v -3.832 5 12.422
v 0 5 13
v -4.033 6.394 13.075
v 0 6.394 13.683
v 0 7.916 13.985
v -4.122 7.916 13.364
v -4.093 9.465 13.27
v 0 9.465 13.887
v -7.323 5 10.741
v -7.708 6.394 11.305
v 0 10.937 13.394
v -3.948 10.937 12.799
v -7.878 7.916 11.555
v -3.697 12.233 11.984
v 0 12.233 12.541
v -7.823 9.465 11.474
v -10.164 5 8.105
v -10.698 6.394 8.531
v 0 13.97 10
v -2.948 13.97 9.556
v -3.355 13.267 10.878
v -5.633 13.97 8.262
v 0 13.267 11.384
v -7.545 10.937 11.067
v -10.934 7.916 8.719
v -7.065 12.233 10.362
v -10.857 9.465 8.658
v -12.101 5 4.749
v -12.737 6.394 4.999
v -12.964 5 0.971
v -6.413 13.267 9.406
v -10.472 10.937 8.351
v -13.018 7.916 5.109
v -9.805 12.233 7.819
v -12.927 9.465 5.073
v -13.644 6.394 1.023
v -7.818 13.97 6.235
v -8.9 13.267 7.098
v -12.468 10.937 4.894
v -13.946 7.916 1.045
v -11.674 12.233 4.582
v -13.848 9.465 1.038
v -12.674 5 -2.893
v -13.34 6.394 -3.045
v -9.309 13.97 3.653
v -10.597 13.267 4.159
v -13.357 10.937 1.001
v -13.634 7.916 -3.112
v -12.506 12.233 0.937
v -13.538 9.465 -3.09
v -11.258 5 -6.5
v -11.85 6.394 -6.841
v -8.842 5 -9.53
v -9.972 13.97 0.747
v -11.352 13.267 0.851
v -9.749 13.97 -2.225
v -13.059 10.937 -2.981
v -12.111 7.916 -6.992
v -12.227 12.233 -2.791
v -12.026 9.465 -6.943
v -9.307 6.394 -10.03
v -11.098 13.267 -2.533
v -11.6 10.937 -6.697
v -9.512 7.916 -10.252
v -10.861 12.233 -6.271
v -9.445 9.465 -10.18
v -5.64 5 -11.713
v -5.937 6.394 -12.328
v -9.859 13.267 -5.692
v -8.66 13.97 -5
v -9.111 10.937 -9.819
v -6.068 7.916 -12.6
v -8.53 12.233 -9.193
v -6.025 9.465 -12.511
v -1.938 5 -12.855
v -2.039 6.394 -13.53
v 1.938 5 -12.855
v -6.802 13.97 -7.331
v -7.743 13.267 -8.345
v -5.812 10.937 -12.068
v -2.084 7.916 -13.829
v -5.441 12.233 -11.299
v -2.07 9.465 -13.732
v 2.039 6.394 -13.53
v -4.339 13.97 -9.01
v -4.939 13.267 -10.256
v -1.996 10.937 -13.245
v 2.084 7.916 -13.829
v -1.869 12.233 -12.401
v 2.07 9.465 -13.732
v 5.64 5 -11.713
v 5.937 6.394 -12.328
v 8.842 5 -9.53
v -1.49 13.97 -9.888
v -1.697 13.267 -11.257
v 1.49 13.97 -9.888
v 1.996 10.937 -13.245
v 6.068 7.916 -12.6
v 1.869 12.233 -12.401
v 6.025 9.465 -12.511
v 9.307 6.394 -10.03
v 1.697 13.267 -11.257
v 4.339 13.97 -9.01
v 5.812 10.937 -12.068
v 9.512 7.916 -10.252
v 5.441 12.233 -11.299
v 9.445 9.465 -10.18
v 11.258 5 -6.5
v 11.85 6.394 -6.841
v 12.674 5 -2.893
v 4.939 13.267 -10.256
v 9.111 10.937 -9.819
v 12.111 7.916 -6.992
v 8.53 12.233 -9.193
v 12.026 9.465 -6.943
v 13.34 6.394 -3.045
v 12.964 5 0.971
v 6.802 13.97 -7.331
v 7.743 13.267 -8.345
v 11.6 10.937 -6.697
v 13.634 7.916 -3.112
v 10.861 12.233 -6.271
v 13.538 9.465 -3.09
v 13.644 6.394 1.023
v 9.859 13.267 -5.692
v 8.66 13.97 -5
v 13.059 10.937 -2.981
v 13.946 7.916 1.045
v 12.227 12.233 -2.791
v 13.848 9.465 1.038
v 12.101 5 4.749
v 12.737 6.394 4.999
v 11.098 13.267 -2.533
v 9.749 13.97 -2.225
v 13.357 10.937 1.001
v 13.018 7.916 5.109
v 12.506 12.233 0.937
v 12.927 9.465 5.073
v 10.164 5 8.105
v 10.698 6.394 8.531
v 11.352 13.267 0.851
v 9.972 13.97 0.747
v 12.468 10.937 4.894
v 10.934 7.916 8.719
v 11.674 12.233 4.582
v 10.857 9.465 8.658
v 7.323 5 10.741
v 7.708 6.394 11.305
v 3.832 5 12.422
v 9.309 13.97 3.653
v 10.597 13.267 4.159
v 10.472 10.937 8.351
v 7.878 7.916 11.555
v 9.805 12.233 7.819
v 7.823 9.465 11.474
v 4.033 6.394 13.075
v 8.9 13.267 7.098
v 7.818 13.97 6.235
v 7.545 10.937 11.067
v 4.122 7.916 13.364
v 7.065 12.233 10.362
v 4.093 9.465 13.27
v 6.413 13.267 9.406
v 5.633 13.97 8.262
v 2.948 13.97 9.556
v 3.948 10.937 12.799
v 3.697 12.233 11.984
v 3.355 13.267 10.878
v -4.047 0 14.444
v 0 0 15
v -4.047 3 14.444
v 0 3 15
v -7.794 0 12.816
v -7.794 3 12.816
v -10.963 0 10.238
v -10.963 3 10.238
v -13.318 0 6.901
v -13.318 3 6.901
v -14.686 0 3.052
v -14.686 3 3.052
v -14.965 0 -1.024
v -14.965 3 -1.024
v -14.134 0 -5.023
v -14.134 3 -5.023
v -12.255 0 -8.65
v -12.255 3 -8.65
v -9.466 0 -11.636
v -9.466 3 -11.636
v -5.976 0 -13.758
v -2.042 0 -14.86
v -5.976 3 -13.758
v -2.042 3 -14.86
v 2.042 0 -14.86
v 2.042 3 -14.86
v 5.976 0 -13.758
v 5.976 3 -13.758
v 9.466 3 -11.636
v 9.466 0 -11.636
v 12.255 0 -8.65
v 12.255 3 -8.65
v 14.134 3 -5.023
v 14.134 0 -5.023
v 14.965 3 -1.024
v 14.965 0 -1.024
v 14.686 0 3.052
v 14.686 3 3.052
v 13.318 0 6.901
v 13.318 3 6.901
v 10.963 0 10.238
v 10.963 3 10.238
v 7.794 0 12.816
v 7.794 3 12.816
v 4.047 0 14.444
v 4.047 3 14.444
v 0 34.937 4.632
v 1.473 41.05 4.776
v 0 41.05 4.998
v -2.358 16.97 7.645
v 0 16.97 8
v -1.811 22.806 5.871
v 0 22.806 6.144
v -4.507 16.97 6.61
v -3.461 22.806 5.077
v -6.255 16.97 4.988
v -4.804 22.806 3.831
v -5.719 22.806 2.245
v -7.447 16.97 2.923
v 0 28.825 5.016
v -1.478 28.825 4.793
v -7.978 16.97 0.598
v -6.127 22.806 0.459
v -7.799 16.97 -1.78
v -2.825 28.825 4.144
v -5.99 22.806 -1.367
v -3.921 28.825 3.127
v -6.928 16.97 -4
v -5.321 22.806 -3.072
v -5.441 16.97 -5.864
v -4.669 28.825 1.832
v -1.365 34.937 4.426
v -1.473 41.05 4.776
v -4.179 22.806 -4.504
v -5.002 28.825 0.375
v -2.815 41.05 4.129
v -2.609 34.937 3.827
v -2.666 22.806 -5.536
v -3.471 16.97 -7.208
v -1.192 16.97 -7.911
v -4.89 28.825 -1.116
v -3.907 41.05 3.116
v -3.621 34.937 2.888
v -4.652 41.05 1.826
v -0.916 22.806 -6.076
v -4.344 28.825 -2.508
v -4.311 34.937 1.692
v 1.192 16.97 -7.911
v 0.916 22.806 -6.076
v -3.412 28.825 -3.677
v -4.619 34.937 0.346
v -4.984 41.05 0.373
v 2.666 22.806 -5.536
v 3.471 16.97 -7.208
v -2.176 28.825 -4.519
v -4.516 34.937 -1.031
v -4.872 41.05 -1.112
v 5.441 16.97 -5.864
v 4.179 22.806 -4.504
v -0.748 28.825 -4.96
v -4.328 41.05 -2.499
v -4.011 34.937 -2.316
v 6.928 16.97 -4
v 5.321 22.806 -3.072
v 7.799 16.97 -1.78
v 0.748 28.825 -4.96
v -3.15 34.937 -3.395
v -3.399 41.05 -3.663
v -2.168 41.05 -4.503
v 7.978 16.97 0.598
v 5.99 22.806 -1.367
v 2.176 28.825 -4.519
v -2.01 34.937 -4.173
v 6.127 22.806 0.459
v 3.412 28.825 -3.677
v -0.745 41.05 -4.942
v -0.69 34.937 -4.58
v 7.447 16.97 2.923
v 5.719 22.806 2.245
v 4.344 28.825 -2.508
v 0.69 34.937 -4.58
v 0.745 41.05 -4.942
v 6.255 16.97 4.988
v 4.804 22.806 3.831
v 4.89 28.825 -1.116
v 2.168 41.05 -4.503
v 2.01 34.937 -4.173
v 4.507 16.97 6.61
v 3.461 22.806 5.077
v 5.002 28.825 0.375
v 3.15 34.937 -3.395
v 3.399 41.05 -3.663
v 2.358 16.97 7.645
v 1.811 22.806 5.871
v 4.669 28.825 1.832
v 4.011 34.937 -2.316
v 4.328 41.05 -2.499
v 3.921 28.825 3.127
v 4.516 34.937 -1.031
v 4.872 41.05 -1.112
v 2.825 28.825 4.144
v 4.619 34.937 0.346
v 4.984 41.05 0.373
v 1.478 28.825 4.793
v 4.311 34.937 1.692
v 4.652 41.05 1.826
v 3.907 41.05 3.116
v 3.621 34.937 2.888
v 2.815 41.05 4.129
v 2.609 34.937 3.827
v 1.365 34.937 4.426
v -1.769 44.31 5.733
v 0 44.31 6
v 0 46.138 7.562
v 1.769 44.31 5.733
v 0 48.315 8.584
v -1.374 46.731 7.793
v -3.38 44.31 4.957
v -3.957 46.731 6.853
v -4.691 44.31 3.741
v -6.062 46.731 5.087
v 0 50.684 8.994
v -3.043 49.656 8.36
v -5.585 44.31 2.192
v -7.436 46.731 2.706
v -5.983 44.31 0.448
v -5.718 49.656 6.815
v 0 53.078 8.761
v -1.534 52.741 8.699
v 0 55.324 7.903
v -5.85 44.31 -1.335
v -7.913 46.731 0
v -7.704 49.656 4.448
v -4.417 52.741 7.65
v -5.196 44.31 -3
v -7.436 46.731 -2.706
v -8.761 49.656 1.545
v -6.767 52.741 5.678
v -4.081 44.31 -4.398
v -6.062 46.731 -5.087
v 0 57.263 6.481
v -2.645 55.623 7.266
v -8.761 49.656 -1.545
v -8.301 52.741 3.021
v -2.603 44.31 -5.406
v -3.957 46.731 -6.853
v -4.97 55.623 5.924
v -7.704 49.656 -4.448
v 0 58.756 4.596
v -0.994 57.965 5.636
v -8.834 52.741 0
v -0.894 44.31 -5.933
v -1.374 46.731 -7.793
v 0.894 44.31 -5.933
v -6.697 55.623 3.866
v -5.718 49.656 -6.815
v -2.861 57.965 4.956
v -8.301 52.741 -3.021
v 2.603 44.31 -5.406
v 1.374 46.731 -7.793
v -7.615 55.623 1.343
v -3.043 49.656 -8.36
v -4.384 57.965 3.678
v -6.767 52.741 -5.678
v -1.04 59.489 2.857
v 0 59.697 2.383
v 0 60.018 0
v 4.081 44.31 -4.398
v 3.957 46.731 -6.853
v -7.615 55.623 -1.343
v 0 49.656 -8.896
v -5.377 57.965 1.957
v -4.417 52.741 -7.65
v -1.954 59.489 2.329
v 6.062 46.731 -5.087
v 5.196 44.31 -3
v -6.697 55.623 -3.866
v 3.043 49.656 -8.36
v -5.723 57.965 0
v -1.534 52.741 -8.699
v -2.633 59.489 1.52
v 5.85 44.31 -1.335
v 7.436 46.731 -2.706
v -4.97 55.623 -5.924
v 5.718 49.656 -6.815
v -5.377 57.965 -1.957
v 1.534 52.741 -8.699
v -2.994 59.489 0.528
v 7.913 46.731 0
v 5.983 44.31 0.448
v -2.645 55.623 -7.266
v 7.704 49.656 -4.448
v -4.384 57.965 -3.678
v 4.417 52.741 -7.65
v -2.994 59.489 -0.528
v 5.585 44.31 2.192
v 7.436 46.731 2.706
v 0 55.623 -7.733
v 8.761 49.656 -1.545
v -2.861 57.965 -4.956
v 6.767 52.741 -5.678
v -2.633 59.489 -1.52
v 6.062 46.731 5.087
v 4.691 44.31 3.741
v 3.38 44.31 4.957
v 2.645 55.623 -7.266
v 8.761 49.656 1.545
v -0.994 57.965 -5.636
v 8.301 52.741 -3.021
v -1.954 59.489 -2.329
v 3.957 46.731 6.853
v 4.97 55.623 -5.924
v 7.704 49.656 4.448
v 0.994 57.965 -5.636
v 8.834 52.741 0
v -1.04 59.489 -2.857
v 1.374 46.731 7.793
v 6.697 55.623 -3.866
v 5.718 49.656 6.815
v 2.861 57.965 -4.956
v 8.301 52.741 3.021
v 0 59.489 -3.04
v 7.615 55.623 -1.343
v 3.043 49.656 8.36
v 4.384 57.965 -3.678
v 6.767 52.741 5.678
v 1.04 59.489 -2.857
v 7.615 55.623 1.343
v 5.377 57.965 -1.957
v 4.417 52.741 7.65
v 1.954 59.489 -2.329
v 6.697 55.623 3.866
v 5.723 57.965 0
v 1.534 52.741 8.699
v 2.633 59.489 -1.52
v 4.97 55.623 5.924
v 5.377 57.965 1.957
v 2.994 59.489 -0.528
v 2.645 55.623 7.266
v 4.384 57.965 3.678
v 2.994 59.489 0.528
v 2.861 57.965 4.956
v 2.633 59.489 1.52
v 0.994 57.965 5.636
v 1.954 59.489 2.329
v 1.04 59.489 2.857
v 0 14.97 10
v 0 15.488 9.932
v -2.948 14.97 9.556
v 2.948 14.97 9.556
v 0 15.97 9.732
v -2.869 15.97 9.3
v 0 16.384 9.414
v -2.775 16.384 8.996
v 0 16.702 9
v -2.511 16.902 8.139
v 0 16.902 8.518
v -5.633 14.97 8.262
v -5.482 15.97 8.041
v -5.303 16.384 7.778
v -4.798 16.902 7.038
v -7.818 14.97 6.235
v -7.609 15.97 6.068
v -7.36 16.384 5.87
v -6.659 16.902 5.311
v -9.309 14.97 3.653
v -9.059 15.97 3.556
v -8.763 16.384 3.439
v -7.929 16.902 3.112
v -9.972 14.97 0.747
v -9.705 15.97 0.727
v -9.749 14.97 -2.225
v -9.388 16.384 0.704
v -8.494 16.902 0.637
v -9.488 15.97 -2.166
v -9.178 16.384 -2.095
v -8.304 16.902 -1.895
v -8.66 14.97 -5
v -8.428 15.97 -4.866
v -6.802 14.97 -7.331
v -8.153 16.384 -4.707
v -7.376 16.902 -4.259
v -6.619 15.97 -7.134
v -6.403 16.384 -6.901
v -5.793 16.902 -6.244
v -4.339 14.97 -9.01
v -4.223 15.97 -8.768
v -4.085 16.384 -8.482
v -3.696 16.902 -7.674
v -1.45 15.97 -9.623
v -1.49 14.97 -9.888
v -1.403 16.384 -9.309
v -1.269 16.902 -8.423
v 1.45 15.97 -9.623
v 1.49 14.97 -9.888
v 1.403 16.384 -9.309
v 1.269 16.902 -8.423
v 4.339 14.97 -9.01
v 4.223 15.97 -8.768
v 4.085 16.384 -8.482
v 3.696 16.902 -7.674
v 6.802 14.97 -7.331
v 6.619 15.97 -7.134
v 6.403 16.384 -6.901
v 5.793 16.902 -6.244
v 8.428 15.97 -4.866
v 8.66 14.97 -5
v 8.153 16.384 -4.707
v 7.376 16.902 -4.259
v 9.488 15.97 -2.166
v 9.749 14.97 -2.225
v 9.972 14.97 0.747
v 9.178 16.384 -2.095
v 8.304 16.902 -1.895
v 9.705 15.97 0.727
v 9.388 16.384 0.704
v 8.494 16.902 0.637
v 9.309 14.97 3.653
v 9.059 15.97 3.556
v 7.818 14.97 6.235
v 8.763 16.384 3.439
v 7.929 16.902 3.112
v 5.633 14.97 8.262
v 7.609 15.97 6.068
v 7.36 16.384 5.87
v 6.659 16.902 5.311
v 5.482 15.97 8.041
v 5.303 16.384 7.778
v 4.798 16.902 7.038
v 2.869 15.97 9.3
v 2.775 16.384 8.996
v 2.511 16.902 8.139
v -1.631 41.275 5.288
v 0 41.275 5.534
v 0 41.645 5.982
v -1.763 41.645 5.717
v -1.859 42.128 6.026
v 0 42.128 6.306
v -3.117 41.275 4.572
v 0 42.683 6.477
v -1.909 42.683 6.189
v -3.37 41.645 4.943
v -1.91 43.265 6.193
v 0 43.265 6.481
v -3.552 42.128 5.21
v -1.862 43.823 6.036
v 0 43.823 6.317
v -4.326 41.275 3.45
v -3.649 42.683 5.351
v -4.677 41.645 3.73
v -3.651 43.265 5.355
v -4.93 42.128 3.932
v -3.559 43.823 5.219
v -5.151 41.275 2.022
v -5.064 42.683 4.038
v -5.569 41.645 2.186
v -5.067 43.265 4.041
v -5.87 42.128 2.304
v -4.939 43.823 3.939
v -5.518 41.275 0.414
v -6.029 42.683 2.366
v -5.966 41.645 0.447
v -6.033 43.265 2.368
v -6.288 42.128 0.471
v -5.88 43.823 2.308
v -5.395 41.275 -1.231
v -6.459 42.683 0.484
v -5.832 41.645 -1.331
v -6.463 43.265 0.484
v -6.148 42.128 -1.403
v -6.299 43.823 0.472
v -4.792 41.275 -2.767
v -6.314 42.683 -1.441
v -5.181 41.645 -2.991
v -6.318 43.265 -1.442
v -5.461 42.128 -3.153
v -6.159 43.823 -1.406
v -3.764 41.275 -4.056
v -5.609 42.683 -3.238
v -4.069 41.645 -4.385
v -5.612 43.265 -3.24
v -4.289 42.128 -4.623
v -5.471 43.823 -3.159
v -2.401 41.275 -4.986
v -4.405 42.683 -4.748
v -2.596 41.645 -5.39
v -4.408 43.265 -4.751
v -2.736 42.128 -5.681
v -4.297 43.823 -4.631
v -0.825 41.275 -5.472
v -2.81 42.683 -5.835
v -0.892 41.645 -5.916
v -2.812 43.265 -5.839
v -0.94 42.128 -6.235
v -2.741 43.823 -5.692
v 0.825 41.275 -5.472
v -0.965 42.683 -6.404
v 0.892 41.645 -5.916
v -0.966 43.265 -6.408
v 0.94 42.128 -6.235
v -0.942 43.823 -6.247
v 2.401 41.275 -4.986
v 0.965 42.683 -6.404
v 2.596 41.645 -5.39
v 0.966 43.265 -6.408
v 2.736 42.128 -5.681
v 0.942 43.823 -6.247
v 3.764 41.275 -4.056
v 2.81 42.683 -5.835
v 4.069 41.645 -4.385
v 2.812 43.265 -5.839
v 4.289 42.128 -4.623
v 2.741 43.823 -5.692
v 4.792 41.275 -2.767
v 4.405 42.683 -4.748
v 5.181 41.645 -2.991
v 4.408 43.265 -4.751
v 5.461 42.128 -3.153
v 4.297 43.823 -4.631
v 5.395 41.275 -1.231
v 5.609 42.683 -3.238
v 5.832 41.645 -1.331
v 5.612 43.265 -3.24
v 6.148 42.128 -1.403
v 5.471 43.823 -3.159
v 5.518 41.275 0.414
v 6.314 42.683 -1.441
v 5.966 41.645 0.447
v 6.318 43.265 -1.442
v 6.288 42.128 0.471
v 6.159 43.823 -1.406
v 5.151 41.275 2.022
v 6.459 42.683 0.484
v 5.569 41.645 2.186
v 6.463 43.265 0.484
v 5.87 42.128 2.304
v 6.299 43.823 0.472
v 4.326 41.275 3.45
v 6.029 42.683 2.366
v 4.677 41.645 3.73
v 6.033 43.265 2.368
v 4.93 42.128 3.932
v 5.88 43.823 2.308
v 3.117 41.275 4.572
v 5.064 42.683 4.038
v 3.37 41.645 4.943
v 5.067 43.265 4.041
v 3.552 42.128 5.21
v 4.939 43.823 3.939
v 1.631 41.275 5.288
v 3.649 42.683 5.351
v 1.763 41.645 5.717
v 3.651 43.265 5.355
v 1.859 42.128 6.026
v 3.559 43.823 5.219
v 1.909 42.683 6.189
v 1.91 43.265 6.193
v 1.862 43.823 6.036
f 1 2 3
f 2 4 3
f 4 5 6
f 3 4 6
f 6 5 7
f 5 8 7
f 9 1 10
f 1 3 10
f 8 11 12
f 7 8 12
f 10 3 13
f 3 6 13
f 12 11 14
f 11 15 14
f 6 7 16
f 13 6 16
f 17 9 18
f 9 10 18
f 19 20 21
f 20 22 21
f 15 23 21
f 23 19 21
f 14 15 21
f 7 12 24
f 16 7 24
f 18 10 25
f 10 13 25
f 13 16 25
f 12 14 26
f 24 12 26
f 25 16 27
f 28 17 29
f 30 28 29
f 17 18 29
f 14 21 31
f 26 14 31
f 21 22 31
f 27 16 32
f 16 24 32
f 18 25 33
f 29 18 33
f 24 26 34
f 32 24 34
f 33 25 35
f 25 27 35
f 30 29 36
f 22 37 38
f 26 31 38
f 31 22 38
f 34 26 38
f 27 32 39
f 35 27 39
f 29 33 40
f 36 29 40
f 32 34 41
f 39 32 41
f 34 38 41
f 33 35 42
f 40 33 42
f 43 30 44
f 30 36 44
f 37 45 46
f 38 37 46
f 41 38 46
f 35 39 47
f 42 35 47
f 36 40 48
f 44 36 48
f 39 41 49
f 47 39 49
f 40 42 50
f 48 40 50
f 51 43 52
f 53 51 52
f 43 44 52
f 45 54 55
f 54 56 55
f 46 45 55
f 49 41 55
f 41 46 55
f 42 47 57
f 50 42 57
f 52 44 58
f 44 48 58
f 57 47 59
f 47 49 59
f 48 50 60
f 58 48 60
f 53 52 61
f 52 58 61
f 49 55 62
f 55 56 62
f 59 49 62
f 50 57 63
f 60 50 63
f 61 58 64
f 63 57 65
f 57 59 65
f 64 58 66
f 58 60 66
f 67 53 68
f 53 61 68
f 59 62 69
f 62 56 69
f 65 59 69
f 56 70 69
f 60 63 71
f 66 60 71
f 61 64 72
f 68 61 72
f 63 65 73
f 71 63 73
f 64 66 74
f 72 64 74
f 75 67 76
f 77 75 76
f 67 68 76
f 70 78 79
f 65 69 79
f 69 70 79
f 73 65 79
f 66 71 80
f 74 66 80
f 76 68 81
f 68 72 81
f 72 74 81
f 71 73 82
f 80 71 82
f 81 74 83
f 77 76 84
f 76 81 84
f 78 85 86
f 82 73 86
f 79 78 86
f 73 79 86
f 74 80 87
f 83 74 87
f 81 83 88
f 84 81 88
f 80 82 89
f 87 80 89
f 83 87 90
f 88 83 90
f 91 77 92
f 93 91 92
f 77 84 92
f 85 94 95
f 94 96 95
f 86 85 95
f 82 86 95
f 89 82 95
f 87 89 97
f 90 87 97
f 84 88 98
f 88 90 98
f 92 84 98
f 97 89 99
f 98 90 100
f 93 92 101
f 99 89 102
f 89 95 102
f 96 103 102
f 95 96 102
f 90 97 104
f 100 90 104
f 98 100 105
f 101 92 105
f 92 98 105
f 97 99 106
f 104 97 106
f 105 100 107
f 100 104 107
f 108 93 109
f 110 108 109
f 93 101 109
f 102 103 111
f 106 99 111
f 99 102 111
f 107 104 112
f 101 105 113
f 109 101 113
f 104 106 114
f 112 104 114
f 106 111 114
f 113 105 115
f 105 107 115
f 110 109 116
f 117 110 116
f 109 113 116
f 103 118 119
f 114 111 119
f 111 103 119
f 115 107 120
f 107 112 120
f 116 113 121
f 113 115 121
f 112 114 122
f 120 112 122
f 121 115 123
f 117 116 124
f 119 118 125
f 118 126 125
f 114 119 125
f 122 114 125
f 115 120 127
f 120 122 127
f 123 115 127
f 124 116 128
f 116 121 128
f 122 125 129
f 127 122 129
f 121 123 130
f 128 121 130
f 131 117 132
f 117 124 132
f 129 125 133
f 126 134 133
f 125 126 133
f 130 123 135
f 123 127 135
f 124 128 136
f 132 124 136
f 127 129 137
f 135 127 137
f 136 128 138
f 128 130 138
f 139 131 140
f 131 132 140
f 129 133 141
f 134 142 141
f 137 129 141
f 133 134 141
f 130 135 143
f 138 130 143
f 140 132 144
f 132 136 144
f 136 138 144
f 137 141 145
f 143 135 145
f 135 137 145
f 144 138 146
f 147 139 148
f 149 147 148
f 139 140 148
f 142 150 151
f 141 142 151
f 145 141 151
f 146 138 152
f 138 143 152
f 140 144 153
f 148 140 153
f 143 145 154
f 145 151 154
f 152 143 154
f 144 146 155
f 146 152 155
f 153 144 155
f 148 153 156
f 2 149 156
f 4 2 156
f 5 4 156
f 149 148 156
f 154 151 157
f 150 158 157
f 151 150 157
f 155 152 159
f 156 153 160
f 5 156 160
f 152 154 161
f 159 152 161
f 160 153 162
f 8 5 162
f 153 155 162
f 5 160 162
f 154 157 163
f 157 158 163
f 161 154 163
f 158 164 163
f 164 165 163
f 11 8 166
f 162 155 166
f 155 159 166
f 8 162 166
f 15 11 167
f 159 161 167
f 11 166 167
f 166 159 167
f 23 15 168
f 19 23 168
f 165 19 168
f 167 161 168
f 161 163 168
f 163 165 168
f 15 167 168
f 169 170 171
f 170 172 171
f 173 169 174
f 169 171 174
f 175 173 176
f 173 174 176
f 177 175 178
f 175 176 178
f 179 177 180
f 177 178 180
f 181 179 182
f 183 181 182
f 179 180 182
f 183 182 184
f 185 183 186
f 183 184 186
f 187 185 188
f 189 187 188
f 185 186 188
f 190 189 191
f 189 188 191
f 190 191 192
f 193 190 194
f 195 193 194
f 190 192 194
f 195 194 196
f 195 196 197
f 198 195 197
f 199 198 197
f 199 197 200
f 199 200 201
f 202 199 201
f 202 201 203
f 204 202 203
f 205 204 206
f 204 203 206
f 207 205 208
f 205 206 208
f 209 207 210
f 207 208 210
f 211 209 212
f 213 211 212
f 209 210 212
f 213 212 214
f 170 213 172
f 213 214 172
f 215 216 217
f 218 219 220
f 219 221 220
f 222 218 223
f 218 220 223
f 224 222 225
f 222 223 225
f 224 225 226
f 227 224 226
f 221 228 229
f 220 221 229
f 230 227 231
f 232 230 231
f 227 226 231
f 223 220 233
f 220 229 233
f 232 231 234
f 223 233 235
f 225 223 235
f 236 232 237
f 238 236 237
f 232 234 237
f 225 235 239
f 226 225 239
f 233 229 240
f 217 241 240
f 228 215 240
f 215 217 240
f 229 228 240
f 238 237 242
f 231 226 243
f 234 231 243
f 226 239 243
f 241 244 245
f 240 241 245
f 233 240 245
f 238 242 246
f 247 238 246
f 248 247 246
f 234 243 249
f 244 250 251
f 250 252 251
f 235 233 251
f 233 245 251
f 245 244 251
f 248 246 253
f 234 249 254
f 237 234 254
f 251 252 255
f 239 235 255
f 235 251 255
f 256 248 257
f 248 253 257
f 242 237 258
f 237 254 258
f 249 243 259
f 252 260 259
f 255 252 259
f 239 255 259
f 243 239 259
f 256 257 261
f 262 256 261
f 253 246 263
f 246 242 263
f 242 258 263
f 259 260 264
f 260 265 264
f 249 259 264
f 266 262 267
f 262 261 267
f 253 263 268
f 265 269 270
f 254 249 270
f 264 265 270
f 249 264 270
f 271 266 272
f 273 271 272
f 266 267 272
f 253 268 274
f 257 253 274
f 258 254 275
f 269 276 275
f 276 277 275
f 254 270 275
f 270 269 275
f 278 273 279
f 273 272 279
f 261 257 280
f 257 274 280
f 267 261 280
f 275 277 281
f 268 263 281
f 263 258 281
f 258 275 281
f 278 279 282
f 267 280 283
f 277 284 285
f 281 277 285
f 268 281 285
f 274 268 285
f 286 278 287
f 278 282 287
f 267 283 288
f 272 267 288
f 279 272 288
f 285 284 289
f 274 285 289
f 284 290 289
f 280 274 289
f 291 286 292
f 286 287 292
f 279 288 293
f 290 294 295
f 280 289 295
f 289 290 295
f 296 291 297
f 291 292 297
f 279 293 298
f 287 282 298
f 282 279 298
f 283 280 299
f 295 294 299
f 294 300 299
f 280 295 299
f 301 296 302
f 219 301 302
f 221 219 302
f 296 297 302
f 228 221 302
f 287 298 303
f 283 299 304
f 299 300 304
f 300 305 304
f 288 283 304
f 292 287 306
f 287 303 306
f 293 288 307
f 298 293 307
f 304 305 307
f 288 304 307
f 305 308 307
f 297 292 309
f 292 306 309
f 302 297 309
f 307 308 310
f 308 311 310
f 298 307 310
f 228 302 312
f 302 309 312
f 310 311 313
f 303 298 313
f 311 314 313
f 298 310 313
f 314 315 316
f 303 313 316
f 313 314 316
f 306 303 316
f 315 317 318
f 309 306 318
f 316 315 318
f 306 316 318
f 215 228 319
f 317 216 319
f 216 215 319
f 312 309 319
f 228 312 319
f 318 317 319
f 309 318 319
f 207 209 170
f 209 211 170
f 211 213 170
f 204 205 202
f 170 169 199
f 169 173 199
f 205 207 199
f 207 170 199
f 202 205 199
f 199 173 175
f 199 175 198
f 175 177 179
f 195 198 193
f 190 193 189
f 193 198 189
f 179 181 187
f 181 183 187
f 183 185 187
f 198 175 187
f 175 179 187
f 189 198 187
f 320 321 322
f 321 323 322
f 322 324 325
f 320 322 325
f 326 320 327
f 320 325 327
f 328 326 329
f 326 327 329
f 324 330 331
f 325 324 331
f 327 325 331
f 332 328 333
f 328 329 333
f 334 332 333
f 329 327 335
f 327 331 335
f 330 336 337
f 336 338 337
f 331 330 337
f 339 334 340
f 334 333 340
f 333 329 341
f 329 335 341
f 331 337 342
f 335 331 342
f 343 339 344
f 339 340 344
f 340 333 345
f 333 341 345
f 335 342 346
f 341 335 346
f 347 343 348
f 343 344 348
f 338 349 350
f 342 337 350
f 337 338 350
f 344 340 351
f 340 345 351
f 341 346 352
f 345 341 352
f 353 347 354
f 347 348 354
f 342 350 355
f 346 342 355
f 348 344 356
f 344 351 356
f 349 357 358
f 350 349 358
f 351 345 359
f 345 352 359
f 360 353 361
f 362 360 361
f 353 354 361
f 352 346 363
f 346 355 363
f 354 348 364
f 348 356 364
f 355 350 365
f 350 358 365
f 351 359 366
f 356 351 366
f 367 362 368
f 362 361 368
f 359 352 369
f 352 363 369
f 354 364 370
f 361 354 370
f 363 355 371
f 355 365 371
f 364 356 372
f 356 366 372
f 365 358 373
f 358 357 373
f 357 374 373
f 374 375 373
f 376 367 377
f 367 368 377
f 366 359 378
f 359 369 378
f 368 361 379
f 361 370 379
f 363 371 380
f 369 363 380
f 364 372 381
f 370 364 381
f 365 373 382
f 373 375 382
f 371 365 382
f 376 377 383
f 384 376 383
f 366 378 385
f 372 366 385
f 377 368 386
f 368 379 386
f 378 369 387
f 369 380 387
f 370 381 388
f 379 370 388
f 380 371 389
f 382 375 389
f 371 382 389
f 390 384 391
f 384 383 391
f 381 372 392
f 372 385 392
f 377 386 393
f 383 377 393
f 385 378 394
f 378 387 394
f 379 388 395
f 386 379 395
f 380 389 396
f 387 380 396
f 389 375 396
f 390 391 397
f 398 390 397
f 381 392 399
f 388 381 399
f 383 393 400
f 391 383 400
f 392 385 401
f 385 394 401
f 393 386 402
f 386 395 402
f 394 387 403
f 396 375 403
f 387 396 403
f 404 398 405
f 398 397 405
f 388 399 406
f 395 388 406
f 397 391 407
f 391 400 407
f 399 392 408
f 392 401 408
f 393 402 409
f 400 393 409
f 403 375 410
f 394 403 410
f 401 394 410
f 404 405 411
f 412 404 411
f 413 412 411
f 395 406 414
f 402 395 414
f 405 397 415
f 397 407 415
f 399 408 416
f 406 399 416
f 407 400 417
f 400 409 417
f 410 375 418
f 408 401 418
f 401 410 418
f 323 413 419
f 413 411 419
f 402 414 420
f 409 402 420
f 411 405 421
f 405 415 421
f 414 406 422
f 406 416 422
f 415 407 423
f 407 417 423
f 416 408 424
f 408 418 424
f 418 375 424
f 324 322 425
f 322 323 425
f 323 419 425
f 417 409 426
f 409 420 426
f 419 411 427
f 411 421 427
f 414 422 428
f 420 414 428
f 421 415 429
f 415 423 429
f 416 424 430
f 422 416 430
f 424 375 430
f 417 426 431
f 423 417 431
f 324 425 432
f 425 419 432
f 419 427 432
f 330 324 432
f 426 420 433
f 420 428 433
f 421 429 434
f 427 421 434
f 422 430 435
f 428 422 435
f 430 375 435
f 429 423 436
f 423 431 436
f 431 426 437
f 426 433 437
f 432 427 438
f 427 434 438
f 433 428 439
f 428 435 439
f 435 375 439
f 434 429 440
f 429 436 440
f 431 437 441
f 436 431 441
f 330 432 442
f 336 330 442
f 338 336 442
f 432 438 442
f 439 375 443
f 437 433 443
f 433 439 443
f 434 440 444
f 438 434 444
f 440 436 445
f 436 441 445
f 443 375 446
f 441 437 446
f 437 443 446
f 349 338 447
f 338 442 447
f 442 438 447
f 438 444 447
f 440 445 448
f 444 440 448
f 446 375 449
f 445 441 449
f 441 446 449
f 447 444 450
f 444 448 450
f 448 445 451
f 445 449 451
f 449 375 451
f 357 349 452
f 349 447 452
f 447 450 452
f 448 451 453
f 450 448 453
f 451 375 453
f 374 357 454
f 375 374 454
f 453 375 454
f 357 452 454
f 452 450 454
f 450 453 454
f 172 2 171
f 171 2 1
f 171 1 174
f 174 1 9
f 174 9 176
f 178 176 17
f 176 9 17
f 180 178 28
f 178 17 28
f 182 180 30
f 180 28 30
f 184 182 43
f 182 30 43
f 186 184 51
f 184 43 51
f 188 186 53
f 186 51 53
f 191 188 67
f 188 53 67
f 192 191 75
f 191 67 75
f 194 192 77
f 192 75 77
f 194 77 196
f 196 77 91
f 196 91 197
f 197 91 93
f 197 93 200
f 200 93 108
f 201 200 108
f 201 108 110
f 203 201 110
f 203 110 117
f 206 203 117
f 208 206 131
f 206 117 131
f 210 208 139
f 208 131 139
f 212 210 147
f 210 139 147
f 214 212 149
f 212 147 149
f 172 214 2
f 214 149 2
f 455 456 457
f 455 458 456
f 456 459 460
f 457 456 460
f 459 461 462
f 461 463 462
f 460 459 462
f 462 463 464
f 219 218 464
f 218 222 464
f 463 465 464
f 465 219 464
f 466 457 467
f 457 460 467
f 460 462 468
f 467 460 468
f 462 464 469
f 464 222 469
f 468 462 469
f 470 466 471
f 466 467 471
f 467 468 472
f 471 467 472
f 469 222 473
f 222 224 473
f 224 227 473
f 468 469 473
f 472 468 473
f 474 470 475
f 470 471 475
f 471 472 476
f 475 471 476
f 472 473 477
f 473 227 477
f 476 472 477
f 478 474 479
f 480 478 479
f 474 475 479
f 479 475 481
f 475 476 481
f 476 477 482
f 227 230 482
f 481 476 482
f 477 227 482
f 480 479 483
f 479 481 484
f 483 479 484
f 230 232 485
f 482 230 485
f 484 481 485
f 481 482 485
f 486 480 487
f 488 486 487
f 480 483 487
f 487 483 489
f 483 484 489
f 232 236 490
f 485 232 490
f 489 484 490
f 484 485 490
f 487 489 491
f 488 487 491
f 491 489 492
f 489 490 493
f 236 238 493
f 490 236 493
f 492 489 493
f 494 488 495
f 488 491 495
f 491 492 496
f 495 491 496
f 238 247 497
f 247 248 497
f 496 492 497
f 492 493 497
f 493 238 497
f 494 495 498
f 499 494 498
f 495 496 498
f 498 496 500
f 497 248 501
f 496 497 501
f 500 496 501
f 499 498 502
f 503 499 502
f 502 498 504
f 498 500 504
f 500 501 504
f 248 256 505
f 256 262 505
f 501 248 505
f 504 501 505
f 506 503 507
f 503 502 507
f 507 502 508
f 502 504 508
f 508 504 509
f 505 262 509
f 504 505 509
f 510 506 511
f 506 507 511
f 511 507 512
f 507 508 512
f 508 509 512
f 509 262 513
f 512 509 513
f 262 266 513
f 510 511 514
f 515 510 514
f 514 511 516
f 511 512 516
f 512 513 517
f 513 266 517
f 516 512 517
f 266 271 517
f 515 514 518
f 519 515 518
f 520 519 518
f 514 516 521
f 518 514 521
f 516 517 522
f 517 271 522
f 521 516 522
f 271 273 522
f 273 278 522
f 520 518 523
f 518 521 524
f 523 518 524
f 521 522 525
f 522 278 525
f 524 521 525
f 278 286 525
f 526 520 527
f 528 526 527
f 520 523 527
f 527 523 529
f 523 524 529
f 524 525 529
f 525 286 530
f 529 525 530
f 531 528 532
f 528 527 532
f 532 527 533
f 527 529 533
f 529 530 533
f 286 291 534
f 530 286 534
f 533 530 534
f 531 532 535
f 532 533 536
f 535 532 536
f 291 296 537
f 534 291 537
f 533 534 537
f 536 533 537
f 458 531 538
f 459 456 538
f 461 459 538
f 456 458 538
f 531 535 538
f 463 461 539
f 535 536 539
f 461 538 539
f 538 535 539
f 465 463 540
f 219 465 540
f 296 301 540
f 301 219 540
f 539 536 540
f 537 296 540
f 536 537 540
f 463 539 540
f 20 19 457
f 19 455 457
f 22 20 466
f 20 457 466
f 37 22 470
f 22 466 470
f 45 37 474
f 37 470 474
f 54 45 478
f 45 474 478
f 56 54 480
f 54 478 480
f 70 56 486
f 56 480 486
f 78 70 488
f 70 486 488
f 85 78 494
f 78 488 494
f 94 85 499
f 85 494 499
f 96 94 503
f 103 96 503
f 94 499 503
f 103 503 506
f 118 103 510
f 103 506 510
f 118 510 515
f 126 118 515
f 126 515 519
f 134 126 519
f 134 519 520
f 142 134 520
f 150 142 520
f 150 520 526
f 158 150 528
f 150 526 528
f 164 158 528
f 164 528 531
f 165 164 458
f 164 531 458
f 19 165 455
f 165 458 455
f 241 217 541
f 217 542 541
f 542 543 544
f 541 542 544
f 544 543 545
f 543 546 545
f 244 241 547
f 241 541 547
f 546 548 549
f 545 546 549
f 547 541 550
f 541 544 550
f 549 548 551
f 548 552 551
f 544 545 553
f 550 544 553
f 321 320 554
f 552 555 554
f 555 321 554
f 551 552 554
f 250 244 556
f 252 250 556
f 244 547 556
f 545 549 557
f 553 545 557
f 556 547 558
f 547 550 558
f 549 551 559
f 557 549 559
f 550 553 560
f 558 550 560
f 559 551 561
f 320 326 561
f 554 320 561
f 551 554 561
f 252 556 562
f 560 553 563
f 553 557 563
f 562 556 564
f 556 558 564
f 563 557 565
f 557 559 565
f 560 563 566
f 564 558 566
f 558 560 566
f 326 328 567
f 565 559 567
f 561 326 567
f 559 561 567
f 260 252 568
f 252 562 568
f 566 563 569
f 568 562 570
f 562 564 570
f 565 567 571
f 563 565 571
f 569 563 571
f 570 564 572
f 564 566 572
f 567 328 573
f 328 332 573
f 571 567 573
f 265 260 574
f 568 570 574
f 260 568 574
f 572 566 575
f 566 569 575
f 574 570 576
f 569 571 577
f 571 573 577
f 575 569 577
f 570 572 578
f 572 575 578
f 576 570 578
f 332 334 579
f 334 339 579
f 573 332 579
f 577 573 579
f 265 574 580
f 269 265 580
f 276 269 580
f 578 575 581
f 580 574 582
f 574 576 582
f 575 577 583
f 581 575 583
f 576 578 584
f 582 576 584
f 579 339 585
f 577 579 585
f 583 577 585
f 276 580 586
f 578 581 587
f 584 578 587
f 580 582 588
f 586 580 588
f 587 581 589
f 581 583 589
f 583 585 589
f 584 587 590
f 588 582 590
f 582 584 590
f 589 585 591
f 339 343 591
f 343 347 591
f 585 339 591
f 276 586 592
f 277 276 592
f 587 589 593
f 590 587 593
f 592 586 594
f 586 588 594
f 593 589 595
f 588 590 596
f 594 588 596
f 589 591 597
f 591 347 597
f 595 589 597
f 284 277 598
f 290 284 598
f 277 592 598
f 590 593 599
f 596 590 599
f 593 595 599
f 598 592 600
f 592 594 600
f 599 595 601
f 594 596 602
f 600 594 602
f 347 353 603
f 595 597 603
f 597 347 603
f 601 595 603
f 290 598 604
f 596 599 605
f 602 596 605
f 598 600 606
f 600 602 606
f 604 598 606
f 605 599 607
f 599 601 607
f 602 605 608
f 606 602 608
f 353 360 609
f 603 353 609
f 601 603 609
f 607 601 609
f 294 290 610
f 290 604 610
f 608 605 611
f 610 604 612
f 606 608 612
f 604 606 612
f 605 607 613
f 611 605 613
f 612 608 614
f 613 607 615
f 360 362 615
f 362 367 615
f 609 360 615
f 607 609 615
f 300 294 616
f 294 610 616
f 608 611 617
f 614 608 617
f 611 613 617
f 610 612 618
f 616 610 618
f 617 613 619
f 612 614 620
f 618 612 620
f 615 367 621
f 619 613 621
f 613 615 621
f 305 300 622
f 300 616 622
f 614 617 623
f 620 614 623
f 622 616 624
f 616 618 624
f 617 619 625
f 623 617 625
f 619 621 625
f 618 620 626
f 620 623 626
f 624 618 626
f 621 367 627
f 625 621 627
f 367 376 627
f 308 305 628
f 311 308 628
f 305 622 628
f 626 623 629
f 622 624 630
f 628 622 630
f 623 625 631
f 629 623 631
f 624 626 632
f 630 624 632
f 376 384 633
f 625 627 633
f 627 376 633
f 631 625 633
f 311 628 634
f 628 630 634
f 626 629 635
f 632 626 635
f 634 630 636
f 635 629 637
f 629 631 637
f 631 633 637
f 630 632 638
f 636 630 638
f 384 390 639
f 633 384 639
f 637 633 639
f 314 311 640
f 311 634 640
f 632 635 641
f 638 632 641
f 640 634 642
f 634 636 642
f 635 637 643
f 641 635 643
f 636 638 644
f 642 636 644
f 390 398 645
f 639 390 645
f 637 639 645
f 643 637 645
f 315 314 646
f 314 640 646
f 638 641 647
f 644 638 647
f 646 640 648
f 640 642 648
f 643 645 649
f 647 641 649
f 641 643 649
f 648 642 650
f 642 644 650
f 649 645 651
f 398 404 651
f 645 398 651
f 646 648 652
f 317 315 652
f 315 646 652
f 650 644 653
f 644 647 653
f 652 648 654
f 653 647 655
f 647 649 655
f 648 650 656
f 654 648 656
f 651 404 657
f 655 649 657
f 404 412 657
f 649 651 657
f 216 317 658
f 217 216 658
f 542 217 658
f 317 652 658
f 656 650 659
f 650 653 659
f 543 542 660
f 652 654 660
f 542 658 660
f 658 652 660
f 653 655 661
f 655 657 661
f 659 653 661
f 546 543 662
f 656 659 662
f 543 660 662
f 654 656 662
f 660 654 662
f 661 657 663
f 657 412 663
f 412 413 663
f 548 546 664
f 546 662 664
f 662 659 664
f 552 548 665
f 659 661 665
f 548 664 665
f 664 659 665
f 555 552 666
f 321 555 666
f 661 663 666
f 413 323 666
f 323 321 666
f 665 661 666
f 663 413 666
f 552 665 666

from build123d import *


with BuildPart() as part:
    # Çizim1 → Döndür1 (revolve)
    with BuildSketch(Plane.XY, mode=Mode.PRIVATE) as d_nd_r1_sk:
        with BuildLine():
            Line((0, 0), (-15, 0))
            Line((-15, 0), (-15, 3))
            Line((-15, 3), (-13, 5))
            ThreePointArc((-13, 5), (-13.688325627, 10.216881481), (-10, 13.97))
            Line((-10, 13.97), (-10, 14.97))
            ThreePointArc((-10, 14.97), (-9.414213562, 16.384213562), (-8, 16.97))
            ThreePointArc((-8, 16.97), (-5.015767327, 28.825089026), (-4.997543238, 41.05))
            ThreePointArc((-4.997543238, 41.05), (-6.411660207, 42.399284866), (-6, 44.31))
            ThreePointArc((-6, 44.31), (-8.407551231, 54.22960274), (0, 60.018203932))
            Line((0, 60.018203932), (0, 0))
        make_face()
    revolve(d_nd_r1_sk.sketch.rotate(Axis((0, 102.341178824, 0), (0, -1, 0)), 270), axis=Axis((0, 102.341178824, 0), (0, -1, 0)))


solid = part.part
